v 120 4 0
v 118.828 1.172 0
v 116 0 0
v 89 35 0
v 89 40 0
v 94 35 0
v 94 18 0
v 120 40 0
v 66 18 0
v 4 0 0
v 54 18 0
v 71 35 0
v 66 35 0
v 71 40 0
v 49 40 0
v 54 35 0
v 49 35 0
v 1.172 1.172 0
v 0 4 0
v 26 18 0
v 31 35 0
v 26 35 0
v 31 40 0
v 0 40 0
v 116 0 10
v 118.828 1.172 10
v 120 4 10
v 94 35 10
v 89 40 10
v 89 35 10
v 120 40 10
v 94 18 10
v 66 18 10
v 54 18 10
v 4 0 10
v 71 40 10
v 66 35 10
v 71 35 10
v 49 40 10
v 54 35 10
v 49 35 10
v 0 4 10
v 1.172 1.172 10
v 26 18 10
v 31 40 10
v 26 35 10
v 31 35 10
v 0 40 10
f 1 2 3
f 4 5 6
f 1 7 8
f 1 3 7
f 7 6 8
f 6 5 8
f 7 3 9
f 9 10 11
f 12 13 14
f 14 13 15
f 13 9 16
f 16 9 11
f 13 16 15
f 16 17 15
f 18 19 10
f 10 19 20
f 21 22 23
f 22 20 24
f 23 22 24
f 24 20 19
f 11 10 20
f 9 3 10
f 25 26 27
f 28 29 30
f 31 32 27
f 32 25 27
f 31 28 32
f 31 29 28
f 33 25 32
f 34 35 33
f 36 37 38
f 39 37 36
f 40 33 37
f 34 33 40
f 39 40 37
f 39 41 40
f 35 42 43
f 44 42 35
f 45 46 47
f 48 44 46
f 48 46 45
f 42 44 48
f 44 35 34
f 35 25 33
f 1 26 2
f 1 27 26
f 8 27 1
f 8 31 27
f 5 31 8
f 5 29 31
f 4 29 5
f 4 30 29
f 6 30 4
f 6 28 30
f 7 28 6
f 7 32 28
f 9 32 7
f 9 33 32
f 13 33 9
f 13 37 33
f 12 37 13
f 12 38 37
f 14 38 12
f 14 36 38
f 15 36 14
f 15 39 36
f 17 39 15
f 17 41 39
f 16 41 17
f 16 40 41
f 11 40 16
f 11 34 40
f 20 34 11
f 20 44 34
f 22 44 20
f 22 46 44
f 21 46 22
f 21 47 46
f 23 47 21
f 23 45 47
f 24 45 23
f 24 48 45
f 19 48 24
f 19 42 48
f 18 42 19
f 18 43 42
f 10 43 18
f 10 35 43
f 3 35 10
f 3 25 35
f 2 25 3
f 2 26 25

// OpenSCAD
$fn = 32;

// ----------------------------------------------------------------------
// Oversize slot bar: 120 mm bar with 2 oversize windows
// ----------------------------------------------------------------------

// --- parameters (mm) ---
profile_height = 10;      // extrusion height
profile_points = 24;      // points of the closed outline

profile = [[0, 4], [1.172, 1.172], [4, 0], [116, 0], [118.828, 1.172], [120, 4], [120, 40], [89, 40], [89, 35], [94, 35], [94, 18], [66, 18], [66, 35], [71, 35], [71, 40], [49, 40], [49, 35], [54, 35], [54, 18], [26, 18], [26, 35], [31, 35], [31, 40], [0, 40]];  // single closed polygon, 24 points, counter clockwise

// --- the one profile operation ---
linear_extrude(height = profile_height) polygon(points = profile);
